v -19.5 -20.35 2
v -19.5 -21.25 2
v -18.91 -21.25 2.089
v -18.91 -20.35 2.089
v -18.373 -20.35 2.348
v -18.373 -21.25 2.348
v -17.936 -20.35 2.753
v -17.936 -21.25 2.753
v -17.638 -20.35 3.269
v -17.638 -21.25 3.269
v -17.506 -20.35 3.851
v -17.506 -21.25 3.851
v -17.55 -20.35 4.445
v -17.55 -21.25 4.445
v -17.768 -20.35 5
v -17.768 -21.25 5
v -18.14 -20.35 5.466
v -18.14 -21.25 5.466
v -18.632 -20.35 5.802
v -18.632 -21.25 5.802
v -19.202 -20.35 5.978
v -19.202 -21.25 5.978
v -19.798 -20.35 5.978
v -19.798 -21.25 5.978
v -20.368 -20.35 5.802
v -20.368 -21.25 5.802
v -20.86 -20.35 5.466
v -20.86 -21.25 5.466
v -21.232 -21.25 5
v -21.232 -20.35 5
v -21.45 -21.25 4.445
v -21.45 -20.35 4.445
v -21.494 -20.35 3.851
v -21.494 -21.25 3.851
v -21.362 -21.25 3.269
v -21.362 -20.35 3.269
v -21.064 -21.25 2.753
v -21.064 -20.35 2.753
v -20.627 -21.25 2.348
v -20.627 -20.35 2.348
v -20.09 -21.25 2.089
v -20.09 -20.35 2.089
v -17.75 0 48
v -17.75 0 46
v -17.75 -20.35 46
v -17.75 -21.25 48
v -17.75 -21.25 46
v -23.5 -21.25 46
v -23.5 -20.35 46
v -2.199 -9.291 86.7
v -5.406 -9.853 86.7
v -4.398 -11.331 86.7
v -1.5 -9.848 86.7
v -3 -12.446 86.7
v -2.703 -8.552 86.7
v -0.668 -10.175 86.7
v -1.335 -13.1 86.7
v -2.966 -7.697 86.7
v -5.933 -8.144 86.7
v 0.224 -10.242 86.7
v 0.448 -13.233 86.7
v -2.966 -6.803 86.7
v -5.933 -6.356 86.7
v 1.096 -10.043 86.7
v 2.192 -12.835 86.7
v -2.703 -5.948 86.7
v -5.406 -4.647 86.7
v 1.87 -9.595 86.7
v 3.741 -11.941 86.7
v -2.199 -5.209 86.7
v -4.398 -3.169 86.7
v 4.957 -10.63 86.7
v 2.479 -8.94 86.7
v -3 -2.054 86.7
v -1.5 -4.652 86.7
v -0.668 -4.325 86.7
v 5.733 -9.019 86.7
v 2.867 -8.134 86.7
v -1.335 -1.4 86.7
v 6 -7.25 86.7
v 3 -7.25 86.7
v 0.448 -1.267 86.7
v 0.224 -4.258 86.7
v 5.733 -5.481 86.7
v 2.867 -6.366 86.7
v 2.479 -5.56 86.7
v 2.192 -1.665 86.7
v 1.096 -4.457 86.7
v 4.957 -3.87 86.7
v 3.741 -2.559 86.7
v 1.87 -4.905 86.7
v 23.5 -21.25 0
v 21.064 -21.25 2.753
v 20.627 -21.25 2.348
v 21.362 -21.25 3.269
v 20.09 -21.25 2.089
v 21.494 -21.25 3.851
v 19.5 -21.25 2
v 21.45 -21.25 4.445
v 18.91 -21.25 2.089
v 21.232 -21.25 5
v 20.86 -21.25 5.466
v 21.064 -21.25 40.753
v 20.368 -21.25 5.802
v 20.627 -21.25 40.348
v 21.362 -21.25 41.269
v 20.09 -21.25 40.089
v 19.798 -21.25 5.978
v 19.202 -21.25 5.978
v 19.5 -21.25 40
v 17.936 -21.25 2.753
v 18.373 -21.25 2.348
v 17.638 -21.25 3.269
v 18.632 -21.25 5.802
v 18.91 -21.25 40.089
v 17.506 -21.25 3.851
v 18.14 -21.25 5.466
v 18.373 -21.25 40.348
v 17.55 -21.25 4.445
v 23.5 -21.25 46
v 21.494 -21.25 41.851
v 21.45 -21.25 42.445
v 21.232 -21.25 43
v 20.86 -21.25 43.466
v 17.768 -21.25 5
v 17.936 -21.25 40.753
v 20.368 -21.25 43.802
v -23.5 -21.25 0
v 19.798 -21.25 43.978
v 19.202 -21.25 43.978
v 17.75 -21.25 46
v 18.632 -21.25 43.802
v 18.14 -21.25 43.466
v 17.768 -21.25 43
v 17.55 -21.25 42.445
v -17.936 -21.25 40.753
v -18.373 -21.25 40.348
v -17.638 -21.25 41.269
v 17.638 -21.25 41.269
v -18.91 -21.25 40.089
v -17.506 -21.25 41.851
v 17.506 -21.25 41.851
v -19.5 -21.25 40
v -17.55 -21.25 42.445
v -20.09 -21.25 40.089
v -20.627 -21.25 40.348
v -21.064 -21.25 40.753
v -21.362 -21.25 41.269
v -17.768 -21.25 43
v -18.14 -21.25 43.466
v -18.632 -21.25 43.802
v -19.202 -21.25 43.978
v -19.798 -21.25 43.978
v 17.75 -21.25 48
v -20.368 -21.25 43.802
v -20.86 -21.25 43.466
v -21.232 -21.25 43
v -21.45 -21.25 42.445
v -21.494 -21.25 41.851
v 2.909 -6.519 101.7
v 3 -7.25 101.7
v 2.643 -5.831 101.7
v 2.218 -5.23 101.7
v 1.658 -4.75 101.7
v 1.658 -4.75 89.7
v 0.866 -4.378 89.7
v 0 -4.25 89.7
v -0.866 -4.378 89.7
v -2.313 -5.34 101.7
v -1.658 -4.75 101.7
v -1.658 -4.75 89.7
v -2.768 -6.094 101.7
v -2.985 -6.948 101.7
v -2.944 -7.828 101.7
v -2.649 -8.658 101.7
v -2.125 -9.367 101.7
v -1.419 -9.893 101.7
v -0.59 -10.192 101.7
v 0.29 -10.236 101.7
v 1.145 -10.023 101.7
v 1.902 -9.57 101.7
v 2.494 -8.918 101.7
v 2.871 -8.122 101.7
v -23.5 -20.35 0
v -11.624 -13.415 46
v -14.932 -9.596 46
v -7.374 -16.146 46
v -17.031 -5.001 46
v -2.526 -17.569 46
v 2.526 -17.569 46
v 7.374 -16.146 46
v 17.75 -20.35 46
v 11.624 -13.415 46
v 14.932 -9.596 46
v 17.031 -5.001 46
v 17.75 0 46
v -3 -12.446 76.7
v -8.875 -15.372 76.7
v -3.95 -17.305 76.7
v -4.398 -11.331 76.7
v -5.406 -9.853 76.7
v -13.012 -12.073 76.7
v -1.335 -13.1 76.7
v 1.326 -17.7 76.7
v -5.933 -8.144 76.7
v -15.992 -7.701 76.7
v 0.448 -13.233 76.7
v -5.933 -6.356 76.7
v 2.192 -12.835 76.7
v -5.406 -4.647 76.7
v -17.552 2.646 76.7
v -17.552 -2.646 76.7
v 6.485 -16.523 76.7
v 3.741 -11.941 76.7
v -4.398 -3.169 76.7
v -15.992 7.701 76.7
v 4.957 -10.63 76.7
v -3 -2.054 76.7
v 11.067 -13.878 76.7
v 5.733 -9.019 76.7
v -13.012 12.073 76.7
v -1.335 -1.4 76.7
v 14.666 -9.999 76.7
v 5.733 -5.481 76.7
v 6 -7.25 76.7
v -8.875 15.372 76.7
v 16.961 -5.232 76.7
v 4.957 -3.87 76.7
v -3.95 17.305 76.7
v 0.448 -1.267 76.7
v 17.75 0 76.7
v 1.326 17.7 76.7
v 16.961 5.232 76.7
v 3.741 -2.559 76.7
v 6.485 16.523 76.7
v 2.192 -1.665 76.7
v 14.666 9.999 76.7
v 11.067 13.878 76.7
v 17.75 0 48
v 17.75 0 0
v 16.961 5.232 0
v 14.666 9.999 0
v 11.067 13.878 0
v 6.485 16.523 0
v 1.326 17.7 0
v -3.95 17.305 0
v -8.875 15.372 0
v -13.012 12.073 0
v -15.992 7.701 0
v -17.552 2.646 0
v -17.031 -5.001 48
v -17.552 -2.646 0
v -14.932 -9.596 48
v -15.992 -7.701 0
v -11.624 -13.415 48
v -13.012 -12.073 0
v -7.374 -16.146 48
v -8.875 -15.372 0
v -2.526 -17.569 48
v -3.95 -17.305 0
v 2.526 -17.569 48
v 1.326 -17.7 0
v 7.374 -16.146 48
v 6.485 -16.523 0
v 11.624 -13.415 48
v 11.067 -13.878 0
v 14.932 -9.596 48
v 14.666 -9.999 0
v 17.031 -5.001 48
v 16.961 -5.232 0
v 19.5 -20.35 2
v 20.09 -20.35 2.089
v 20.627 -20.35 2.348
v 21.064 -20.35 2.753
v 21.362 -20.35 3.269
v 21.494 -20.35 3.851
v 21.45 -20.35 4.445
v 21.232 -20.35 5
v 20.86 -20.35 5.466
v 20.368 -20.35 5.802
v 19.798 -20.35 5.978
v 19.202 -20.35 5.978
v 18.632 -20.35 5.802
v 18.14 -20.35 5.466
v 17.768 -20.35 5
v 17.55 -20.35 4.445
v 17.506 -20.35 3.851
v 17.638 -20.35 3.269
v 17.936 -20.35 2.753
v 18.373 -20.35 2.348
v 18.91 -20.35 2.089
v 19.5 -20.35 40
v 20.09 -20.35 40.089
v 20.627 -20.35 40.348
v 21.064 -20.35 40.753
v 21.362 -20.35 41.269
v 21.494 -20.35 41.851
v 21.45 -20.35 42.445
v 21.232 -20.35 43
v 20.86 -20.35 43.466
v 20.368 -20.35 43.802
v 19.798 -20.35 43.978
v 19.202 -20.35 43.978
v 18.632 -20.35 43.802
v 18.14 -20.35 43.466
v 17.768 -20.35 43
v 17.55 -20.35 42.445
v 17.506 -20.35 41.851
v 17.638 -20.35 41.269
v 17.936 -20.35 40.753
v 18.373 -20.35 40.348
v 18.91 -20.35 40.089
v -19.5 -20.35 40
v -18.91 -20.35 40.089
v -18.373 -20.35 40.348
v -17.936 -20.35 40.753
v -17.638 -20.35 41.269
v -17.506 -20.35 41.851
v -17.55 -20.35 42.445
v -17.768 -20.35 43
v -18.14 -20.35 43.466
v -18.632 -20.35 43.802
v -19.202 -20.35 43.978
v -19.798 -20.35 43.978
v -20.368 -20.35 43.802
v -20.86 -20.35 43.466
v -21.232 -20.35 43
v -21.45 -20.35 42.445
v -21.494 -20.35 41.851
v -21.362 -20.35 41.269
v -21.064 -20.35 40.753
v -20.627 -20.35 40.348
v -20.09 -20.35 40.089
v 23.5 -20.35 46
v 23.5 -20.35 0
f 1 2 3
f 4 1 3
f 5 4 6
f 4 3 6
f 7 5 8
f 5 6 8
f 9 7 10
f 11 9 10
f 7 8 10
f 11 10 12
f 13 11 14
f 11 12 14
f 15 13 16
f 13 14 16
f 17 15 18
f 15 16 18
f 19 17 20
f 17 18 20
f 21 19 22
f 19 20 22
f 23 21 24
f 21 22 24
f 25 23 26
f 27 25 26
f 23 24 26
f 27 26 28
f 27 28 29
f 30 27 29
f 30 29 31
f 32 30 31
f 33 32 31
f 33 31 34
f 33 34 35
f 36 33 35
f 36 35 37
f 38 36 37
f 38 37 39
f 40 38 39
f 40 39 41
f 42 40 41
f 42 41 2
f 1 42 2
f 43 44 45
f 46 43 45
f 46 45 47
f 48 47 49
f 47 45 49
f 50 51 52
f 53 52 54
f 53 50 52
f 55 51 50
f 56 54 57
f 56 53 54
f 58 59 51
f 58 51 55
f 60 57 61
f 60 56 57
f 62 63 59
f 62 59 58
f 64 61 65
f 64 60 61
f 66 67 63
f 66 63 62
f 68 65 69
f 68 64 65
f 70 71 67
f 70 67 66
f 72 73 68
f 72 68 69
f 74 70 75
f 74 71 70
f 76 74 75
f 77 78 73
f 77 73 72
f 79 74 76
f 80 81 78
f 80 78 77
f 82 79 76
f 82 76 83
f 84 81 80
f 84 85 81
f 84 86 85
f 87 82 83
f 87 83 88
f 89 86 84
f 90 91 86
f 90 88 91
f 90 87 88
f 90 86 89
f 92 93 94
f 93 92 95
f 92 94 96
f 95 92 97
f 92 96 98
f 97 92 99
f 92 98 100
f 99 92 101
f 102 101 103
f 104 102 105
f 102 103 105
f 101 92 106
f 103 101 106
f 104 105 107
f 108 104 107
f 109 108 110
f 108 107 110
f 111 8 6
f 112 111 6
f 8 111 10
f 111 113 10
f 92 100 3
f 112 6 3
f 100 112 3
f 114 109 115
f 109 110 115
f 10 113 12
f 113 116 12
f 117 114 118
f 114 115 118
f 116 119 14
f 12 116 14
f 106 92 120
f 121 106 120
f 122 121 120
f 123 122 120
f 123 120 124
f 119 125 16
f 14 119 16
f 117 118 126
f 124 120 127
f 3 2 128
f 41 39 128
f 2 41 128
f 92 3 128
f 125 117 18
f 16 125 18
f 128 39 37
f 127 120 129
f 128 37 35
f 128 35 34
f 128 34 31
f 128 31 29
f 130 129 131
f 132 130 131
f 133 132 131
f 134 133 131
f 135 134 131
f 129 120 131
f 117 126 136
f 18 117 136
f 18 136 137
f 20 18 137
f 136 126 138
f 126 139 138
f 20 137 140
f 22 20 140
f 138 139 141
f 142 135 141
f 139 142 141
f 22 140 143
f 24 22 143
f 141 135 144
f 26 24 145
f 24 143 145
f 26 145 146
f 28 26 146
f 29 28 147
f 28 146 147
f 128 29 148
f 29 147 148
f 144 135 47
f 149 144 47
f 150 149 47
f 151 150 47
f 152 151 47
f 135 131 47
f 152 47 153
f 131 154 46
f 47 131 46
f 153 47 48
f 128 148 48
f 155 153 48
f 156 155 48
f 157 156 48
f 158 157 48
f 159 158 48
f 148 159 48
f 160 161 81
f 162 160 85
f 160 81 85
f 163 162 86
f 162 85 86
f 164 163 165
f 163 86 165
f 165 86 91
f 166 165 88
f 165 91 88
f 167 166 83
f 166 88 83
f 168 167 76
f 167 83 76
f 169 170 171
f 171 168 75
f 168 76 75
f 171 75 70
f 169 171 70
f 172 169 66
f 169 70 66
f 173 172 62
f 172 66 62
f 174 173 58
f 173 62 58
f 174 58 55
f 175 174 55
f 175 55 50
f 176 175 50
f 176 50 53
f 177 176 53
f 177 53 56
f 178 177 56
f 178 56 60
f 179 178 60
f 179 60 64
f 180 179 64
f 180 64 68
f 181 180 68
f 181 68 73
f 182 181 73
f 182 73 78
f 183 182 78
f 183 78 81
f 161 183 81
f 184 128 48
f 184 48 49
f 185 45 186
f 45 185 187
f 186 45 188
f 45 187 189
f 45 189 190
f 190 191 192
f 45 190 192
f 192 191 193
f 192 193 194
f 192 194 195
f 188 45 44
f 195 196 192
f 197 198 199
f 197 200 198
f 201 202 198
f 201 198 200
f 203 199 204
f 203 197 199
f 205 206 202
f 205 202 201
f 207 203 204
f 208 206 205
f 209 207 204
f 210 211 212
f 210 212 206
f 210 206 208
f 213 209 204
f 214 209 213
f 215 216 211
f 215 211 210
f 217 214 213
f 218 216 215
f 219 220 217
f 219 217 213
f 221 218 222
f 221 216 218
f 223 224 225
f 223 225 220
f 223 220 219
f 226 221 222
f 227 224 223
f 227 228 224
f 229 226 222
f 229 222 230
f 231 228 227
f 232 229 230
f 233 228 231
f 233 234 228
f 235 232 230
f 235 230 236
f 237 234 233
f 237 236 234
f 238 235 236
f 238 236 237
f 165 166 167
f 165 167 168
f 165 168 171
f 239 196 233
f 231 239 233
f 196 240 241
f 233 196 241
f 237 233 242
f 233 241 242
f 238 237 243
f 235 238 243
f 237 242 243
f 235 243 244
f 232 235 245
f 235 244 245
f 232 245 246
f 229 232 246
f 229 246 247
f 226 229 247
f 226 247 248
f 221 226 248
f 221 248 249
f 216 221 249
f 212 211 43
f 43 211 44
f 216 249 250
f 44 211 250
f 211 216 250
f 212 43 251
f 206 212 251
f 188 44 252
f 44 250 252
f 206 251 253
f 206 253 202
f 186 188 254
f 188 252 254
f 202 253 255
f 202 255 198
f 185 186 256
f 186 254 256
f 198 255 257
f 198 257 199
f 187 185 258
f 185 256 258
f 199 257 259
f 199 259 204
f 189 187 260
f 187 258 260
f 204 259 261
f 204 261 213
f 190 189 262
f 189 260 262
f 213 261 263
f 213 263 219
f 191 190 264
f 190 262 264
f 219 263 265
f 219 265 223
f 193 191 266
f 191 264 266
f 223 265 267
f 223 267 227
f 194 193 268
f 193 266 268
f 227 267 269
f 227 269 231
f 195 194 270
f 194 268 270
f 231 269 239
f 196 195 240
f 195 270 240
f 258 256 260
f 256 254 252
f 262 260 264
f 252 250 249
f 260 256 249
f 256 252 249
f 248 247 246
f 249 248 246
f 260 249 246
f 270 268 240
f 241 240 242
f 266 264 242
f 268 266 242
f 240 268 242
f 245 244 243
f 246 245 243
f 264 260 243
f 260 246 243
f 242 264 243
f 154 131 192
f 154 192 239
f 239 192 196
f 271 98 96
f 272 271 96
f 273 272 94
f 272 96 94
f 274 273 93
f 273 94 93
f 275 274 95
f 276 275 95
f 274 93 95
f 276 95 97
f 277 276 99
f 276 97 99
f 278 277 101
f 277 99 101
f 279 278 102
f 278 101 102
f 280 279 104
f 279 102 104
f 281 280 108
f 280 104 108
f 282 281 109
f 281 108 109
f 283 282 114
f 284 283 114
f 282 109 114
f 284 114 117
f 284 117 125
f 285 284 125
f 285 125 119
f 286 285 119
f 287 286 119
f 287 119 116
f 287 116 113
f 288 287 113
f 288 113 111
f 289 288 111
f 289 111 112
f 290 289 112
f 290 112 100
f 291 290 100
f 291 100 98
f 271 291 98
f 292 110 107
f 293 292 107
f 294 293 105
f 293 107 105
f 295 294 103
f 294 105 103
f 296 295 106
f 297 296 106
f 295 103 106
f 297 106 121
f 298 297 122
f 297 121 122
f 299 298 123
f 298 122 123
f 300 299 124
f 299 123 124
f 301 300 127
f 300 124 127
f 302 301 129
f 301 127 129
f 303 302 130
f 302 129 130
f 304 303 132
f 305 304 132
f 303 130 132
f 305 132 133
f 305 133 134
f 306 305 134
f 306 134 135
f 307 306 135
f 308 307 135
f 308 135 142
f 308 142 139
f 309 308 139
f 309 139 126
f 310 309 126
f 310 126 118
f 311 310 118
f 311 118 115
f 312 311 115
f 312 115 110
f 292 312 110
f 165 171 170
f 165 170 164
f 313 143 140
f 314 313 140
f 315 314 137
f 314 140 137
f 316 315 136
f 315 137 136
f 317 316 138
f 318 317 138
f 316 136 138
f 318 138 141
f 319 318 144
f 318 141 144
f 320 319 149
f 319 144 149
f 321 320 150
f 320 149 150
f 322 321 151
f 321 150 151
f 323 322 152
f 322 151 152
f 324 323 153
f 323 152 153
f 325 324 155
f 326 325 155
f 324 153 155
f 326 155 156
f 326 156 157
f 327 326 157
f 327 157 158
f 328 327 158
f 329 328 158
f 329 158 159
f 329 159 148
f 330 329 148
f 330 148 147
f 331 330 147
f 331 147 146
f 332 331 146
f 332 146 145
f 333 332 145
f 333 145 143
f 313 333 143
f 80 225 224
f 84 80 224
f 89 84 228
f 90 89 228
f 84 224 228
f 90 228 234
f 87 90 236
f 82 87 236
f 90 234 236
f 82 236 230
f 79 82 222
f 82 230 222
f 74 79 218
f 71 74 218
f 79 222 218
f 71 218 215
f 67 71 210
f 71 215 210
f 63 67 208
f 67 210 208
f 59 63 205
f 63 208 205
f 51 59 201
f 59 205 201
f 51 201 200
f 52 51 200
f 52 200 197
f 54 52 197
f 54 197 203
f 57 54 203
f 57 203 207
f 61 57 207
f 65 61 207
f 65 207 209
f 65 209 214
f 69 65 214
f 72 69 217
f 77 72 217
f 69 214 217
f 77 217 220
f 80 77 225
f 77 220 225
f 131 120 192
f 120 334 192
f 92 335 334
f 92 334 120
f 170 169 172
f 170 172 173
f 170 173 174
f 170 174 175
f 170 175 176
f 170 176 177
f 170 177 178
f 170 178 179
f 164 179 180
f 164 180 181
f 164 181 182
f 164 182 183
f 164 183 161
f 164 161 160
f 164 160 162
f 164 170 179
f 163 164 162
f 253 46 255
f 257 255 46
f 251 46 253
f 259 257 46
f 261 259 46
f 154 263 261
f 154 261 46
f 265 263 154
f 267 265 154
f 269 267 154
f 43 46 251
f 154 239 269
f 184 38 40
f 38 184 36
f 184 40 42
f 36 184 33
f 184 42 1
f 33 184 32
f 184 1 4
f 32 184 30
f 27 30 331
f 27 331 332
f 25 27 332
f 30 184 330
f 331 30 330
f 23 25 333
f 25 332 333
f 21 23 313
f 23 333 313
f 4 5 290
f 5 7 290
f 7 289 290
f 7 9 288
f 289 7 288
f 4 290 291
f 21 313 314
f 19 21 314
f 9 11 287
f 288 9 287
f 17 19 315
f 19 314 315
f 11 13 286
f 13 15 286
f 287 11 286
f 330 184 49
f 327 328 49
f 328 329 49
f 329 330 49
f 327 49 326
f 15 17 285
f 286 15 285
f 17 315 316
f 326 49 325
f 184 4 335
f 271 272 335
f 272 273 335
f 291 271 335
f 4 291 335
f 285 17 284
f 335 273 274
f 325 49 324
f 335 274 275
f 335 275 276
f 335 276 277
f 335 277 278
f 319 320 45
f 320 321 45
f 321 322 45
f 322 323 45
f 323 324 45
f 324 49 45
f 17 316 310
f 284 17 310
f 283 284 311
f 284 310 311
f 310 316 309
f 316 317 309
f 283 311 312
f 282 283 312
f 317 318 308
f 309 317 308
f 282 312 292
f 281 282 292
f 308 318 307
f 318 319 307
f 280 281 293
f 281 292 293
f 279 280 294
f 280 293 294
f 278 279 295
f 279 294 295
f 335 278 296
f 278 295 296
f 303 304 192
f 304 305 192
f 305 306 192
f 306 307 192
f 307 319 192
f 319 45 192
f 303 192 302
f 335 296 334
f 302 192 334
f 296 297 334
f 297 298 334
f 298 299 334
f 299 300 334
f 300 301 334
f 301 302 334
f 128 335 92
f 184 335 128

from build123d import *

# Parameters (mm, degrees)
SKETCH1_R           = 17.75
BOSS_EXTRUDE1_DEPTH = 46
BOSS_EXTRUDE2_DEPTH = 2
BOSS_EXTRUDE3_DEPTH = 46
SKETCH4_R           = 17.75
BOSS_EXTRUDE4_DEPTH = 28.7
SKETCH5_R           = 6
BOSS_EXTRUDE5_DEPTH = 10
SKETCH6_R           = 3
BOSS_EXTRUDE6_DEPTH = 15
CUT_EXTRUDE1_START  = -12
CUT_EXTRUDE1_DEPTH  = 12
SKETCH8_R           = 2
CUT_EXTRUDE7_DEPTH  = 12


with BuildPart() as part:
    # Sketch1 → Boss-Extrude1 (new body)
    with BuildSketch(Plane.XY):
        Circle(SKETCH1_R)
    extrude(amount=BOSS_EXTRUDE1_DEPTH)

    # Sketch2 → Boss-Extrude2 (add)
    with BuildSketch(Plane.XY.offset(46)):
        with BuildLine():
            Line((-17.75, -21.25), (17.75, -21.25))
            Line((17.75, -21.25), (17.75, 0))
            ThreePointArc((17.75, 0), (0, 17.75), (-17.75, 0))
            Line((-17.75, 0), (-17.75, -21.25))
        make_face()
    extrude(amount=BOSS_EXTRUDE2_DEPTH)

    # Sketch3 → Boss-Extrude3 (add)
    with BuildSketch(Plane(origin=(0, 0, 46), x_dir=(-1, 0, 0), z_dir=(0, 0, -1))):
        Polygon((0, -21.25), (23.5, -21.25), (23.5, -20.35), (-23.5, -20.35), (-23.5, -21.25), align=None)
    extrude(amount=BOSS_EXTRUDE3_DEPTH)

    # Sketch4 → Boss-Extrude4 (add)
    with BuildSketch(Plane.XY.offset(48)):
        Circle(SKETCH4_R)
    extrude(amount=BOSS_EXTRUDE4_DEPTH)

    # Sketch5 → Boss-Extrude5 (add)
    with BuildSketch(Plane.XY.offset(76.7)):
        with Locations((0, -7.25)):
            Circle(SKETCH5_R)
    extrude(amount=BOSS_EXTRUDE5_DEPTH)

    # Sketch6 → Boss-Extrude6 (add)
    with BuildSketch(Plane.XY.offset(86.7)):
        with Locations((0, -7.25)):
            Circle(SKETCH6_R)
    extrude(amount=BOSS_EXTRUDE6_DEPTH)

    # Sketch7 → Cut-Extrude1 (cut)
    with BuildSketch(Plane.XY.offset(101.7).offset(CUT_EXTRUDE1_START)):
        with BuildLine():
            Line((-1.658312395, -4.75), (1.658312395, -4.75))
            ThreePointArc((1.658312395, -4.75), (0, -4.25), (-1.658312395, -4.75))
        make_face()
    extrude(amount=CUT_EXTRUDE1_DEPTH, mode=Mode.SUBTRACT)

    # Sketch8 → Cut-Extrude7 (cut)
    with BuildSketch(Plane(origin=(0, -21.25, 0), x_dir=(-1, 0, 0), z_dir=(0, -1, 0))):
        with Locations(Location((19.5, -42, 0), (0, 0, 90))):
            Circle(SKETCH8_R)
        with Locations(Location((-19.5, -42, 0), (0, 0, 90))):
            Circle(SKETCH8_R)
        with Locations(Location((19.5, -4, 0), (0, 0, 90))):
            Circle(SKETCH8_R)
        with Locations(Location((-19.5, -4, 0), (0, 0, 90))):
            Circle(SKETCH8_R)
    extrude(amount=-CUT_EXTRUDE7_DEPTH, mode=Mode.SUBTRACT)


solid = part.part
